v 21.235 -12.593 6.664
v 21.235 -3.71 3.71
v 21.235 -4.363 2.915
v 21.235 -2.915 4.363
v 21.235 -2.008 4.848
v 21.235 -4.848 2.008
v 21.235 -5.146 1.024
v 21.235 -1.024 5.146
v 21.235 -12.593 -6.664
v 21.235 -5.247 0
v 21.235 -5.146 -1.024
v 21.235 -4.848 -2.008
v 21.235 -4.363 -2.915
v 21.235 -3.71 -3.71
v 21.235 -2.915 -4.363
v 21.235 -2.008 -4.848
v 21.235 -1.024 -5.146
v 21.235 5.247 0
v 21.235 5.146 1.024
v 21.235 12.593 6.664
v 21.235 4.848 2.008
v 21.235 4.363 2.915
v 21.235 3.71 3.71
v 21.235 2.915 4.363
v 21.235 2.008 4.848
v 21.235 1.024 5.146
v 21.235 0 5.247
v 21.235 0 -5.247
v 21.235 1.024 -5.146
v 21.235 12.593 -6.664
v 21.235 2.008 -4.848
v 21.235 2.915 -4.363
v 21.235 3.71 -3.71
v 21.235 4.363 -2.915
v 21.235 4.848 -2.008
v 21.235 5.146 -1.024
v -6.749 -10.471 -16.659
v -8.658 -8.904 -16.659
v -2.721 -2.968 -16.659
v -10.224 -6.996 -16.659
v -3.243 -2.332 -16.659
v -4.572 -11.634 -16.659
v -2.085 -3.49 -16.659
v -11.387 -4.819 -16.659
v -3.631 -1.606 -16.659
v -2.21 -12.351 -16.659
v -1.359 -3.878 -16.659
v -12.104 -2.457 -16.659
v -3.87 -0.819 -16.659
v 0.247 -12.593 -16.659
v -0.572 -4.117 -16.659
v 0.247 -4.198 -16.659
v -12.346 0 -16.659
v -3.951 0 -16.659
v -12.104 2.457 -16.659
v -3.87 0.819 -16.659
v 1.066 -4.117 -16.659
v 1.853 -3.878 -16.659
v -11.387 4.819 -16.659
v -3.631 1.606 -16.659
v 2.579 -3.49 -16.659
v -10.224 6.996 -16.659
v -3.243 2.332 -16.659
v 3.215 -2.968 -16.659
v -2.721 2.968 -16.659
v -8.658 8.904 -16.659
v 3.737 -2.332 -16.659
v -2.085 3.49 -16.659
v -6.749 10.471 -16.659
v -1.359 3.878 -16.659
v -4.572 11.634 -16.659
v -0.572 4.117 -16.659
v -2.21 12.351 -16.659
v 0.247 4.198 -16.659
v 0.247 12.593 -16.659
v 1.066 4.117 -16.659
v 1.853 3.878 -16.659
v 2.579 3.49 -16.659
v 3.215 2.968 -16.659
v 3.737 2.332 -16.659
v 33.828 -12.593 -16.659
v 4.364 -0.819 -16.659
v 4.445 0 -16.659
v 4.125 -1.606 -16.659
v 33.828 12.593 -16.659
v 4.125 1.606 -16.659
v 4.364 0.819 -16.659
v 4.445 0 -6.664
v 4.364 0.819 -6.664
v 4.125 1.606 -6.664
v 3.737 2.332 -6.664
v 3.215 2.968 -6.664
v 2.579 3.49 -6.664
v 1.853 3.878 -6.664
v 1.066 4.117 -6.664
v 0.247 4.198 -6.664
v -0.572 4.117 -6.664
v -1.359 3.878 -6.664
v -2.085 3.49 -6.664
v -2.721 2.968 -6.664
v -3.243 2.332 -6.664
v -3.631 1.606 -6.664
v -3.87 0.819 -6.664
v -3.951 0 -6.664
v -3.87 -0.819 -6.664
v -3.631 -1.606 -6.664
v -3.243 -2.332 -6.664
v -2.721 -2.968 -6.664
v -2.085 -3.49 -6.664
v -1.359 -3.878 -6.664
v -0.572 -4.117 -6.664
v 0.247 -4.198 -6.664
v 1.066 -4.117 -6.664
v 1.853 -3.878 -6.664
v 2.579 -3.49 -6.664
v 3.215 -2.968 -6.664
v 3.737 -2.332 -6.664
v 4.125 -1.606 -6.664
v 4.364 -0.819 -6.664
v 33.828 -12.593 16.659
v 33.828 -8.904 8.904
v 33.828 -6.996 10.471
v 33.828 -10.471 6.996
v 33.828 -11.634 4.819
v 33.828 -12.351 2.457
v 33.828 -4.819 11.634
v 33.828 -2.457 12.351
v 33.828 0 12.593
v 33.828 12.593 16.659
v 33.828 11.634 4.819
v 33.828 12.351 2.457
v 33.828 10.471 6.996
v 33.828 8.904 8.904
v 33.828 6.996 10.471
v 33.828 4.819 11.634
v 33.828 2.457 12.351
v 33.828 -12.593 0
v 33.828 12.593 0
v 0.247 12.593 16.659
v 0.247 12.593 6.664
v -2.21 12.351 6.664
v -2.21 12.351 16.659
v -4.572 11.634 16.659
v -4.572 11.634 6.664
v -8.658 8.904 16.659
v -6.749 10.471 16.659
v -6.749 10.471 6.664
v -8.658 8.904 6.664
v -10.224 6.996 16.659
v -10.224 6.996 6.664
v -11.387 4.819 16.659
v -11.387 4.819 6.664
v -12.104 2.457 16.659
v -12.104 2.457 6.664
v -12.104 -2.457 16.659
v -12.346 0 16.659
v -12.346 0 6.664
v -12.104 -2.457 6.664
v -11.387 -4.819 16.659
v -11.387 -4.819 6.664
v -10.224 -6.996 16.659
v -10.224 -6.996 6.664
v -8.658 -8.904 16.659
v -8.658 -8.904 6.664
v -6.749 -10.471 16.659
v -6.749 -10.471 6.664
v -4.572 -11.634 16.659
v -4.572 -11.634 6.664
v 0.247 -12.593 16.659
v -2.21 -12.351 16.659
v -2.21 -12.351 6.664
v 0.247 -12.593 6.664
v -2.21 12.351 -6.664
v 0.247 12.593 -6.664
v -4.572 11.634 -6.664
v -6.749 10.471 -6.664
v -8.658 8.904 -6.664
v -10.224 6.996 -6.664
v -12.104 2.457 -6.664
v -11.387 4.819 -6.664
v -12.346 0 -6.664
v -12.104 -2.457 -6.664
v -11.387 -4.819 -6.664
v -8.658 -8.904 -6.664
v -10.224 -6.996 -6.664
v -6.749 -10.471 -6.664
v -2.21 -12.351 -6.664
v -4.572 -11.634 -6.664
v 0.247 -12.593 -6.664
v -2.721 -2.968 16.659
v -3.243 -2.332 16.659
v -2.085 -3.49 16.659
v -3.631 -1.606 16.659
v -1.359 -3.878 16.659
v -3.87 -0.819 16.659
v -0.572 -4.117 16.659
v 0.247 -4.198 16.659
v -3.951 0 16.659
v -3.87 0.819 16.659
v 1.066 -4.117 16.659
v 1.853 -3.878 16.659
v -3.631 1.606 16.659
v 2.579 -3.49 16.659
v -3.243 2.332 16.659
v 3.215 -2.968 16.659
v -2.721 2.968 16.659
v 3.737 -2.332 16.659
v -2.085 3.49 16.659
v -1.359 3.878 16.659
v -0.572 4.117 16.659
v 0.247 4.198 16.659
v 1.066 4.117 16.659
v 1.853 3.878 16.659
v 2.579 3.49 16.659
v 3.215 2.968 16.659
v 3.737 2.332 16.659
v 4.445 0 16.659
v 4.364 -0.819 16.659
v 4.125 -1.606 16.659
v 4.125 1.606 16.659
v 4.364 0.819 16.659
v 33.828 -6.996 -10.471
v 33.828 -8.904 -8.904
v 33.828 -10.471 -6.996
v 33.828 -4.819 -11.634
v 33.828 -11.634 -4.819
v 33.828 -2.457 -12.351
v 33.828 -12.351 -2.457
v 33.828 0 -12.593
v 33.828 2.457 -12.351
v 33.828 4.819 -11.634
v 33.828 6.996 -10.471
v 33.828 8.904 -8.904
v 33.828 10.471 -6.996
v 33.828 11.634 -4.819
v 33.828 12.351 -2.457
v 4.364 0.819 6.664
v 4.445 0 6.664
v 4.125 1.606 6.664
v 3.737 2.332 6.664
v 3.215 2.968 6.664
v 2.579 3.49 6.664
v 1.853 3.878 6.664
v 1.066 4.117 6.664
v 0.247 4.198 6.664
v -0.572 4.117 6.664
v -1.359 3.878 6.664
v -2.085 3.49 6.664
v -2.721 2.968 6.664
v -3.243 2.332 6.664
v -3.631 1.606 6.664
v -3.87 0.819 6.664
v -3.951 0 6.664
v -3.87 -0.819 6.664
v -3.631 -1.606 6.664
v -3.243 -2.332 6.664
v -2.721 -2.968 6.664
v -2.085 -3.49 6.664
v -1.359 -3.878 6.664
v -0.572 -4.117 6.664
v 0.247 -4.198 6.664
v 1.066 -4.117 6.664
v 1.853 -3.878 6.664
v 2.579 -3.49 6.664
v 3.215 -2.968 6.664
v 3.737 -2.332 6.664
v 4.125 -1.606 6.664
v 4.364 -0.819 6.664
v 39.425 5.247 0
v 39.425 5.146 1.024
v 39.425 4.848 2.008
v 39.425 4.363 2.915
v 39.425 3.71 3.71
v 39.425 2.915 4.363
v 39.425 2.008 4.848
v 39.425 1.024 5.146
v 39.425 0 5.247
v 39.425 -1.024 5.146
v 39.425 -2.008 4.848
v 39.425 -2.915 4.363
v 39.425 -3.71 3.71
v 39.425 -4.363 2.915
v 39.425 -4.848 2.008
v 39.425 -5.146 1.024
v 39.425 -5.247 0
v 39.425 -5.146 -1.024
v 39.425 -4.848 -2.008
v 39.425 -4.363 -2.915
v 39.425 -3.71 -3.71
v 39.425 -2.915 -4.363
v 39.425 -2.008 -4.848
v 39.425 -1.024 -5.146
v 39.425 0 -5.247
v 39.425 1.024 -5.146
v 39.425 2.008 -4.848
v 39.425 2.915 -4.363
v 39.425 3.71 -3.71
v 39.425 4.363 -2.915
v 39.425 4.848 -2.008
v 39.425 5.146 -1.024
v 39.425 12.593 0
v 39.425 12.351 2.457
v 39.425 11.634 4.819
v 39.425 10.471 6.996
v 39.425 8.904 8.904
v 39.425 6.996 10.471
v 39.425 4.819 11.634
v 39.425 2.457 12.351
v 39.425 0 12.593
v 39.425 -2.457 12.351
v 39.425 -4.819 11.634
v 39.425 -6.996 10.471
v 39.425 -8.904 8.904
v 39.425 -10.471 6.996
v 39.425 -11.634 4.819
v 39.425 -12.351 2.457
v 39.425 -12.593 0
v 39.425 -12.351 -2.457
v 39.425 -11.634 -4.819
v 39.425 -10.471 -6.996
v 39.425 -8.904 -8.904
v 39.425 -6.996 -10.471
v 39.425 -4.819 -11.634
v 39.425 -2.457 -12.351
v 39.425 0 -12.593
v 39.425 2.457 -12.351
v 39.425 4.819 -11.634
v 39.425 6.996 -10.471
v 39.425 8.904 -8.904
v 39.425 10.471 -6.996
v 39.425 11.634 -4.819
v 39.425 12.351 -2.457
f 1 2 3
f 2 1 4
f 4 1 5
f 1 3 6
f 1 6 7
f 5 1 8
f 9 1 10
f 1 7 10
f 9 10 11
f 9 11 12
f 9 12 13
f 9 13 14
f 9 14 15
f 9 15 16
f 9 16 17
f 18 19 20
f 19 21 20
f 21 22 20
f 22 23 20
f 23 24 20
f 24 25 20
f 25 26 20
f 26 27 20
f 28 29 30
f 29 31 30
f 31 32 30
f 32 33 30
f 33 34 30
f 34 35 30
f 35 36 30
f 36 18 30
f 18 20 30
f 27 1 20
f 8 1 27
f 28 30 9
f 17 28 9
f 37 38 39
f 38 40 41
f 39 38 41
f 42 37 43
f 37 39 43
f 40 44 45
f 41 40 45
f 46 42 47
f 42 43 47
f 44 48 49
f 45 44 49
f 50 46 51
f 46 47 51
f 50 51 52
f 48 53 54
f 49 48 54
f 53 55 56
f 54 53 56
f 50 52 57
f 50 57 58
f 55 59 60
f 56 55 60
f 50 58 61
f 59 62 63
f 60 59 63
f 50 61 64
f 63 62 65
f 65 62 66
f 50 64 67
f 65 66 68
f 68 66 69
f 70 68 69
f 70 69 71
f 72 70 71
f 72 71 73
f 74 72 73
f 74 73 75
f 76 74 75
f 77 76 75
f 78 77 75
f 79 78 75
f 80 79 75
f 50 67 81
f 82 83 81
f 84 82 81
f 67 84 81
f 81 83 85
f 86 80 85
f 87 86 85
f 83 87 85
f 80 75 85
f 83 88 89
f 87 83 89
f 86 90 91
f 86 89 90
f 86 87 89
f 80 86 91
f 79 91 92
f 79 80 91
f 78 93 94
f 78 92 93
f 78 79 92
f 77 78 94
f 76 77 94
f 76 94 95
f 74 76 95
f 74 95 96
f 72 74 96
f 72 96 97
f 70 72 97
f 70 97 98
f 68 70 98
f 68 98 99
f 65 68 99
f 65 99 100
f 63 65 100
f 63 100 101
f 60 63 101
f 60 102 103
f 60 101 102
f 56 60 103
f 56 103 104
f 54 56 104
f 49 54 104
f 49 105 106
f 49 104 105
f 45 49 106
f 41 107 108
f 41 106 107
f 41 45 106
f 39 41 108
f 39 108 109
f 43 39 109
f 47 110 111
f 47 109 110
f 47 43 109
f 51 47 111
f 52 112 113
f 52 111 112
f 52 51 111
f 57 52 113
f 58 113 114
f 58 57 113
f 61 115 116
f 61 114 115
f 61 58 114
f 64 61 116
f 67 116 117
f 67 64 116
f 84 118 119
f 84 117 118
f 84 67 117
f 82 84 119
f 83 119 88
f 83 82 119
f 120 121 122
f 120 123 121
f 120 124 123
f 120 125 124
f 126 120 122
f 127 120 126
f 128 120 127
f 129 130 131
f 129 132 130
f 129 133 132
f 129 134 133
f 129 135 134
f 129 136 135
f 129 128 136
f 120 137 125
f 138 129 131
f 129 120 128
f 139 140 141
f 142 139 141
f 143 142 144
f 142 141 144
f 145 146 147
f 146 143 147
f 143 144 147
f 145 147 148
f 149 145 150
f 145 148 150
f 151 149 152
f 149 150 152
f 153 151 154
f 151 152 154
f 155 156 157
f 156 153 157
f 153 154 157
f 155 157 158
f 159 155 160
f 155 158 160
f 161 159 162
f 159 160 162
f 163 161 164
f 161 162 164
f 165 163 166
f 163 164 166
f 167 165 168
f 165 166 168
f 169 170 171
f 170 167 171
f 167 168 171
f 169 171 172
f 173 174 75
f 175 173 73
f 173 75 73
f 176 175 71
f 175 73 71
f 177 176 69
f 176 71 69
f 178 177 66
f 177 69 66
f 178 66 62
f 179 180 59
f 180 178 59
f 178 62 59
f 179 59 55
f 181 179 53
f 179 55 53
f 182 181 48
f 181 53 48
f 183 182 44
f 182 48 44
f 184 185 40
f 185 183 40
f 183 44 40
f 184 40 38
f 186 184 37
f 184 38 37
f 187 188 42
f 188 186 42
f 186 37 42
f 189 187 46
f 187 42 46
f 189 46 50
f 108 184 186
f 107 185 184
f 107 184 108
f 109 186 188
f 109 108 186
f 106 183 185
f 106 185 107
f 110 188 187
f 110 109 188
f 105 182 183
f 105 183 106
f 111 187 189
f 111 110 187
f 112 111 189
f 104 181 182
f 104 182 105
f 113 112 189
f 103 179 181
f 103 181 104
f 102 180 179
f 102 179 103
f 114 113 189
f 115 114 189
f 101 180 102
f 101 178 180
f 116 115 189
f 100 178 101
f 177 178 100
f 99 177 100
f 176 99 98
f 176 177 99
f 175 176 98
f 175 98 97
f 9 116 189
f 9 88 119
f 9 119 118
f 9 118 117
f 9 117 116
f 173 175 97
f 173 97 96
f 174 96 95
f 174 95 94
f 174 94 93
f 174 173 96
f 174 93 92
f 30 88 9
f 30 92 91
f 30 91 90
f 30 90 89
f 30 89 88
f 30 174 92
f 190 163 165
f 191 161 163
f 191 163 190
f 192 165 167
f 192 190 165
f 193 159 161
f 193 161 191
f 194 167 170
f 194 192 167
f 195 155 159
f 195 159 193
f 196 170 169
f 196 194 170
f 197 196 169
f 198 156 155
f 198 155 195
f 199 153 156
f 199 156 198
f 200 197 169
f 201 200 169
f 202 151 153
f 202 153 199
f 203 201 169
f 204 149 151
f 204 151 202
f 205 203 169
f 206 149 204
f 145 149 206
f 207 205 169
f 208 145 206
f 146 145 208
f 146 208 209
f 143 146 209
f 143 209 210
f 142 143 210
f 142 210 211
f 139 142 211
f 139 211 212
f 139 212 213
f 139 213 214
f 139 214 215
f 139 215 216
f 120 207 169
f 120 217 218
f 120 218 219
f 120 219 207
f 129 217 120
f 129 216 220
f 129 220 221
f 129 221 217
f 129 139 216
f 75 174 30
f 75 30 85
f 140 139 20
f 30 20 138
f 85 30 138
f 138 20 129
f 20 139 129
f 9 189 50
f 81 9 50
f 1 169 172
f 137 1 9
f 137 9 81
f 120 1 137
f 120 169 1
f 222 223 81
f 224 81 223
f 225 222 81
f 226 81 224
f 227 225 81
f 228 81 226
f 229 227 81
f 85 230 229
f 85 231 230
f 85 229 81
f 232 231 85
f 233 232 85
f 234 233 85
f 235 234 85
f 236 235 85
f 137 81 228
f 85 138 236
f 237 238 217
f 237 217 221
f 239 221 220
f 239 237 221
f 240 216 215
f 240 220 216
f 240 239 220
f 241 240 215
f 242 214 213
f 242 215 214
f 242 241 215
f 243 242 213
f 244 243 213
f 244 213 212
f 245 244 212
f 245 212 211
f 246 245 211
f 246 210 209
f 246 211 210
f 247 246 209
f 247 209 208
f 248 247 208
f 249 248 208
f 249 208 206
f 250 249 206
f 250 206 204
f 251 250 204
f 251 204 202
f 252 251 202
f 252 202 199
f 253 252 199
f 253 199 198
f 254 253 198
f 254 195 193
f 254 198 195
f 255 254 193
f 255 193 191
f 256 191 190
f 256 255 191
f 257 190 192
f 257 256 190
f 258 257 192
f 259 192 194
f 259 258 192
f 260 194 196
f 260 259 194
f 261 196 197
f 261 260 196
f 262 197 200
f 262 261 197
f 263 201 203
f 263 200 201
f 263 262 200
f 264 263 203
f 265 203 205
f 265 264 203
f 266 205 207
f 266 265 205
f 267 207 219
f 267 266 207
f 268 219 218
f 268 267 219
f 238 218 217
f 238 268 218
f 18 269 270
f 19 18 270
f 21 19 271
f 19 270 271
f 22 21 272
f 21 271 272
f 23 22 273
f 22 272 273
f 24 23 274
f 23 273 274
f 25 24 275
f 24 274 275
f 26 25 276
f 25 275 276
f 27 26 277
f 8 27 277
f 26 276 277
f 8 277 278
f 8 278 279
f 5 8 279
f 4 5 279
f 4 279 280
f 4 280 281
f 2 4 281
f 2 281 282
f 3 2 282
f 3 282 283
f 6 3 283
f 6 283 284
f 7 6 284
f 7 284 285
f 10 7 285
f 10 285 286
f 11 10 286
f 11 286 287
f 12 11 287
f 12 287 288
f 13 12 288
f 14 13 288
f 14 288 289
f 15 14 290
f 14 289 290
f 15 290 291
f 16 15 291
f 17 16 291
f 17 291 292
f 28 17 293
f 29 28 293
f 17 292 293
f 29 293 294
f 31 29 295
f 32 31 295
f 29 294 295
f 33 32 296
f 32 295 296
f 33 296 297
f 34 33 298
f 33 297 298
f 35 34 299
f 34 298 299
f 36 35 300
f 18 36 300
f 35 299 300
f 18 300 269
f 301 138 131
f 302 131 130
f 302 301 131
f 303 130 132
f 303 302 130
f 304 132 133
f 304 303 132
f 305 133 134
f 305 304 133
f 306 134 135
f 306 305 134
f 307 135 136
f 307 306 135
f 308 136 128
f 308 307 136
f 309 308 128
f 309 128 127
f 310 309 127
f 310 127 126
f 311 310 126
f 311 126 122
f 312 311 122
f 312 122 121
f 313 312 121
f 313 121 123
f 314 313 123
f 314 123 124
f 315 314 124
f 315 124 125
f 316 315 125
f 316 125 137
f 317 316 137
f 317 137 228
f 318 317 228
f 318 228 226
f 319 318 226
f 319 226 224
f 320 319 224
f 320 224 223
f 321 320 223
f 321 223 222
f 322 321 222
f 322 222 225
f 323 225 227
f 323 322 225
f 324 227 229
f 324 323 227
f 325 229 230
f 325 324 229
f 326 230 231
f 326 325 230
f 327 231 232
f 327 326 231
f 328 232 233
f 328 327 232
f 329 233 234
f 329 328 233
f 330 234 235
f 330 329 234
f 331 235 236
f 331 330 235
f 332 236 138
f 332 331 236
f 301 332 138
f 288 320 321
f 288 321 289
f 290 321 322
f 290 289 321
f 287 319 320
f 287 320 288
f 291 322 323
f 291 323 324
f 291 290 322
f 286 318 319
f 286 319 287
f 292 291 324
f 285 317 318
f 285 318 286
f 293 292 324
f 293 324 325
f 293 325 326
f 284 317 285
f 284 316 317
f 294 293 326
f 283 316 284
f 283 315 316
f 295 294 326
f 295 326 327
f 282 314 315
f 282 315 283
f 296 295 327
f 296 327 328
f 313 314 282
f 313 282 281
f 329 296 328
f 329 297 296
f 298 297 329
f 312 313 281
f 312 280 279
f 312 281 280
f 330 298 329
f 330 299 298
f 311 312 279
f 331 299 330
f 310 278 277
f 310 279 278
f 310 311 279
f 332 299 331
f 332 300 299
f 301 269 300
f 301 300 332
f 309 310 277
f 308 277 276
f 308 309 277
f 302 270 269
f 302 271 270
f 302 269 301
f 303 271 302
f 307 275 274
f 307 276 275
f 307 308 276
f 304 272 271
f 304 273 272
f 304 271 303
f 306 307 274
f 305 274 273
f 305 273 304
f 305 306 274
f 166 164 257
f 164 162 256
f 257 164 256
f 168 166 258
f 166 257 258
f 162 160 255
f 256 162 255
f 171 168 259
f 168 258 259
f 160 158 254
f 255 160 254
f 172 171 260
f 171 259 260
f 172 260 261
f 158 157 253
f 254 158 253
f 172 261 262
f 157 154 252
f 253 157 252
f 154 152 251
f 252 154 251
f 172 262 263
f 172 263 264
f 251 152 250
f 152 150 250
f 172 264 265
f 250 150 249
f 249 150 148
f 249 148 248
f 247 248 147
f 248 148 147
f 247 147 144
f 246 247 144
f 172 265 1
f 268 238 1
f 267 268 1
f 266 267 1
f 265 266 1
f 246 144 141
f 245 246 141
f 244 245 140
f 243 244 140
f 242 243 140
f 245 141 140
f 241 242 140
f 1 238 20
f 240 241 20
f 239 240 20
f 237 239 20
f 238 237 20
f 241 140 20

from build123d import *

# Parameters (mm, degrees)
SKETCH1_W               = 132
SKETCH1_H               = 72
BOSS_EXTRUDE1_DEPTH     = 47.625
CUT_EXTRUDE1_DEPTH      = 122.344808294
CUT_EXTRUDE1_DEPTH_BACK = 122.344808294
SKETCH3_W               = 96
SKETCH3_H               = 38.1
CUT_EXTRUDE2_DEPTH      = 85.25
SKETCH4_R               = 15
CUT_EXTRUDE3_DEPTH      = 85.25
BOSS_EXTRUDE2_START     = 16
SKETCH5_R               = 36
SKETCH5_R_2             = 15
BOSS_EXTRUDE2_DEPTH     = 16
CUT_EXTRUDE4_DEPTH      = 131.738527221
CUT_EXTRUDE4_DEPTH_BACK = 131.738527221
SKETCH6_R               = 12
SCALE1_SCALE            = 0.53
SCALE2_SCALE            = 0.66


with BuildPart() as part:
    # Sketch1 → Boss-Extrude1 (new, symmetric)
    with BuildSketch(Plane.XY):
        Rectangle(SKETCH1_W, SKETCH1_H)
    extrude(amount=BOSS_EXTRUDE1_DEPTH, both=True)

    # Sketch2 → Cut-Extrude1 (cut, two sides: drawn at the far end of the back side and taken through both)
    with BuildSketch(Plane.XY.offset(47.625).offset(-CUT_EXTRUDE1_DEPTH_BACK)):
        with BuildLine():
            Line((220.000003209, 36), (-30, 36))
            ThreePointArc((-30, 36), (-66, 1.003e-06), (-30.000002006, -36))
            Line((-30.000002006, -36), (220.000001203, -36.000013927))
            Line((220.000001203, -36.000013927), (-280.000005214, -36))
            Line((-280.000005214, -36), (-280.000003209, 36.000013927))
            Line((-280.000003209, 36.000013927), (220.000003209, 36))
        make_face()
    extrude(amount=CUT_EXTRUDE1_DEPTH + CUT_EXTRUDE1_DEPTH_BACK, mode=Mode.SUBTRACT)

    # Sketch3 → Cut-Extrude2 (cut)
    with BuildSketch(Plane(origin=(0, 36, 0), x_dir=(1, 0, 0), z_dir=(0, 1, 0))):
        with Locations((-18, 0)):
            Rectangle(SKETCH3_W, SKETCH3_H)
    extrude(amount=-CUT_EXTRUDE2_DEPTH, mode=Mode.SUBTRACT)

    # Sketch4 → Cut-Extrude3 (cut)
    with BuildSketch(Plane(origin=(66, 0, 0), x_dir=(0, 0, -1), z_dir=(1, 0, 0))):
        with Locations(Location((0, 0, 0), (0, 0, 90))):
            Circle(SKETCH4_R)
    extrude(amount=-CUT_EXTRUDE3_DEPTH, mode=Mode.SUBTRACT)

    # Sketch5 → Boss-Extrude2 (add)
    with BuildSketch(Plane(origin=(66, 0, 0), x_dir=(0, 0, -1), z_dir=(1, 0, 0)).offset(BOSS_EXTRUDE2_START)):
        with Locations(Location((0, 0, 0), (0, 0, 90))):
            Circle(SKETCH5_R)
        with Locations(Location((0, 0, 0), (0, 0, 90))):
            Circle(SKETCH5_R_2, mode=Mode.SUBTRACT)
    extrude(amount=-BOSS_EXTRUDE2_DEPTH)

    # Sketch6 → Cut-Extrude4 (cut, two sides: drawn at the far end of the back side and taken through both)
    with BuildSketch(Plane.XY.offset(47.625).offset(-CUT_EXTRUDE4_DEPTH_BACK)):
        with Locations((-30, 0)):
            Circle(SKETCH6_R)
    extrude(amount=CUT_EXTRUDE4_DEPTH + CUT_EXTRUDE4_DEPTH_BACK, mode=Mode.SUBTRACT)


with BuildPart() as part_1:
    # Scale1: scaled about (16.519385086, 0, 0)
    add(part.part.scale(SCALE1_SCALE).moved(Location((7.76411099, 0, 0))))


with BuildPart() as part_2:
    # Scale2: scaled about (16.519385086, 0, 0)
    add(part_1.part.scale(SCALE2_SCALE).moved(Location((5.616590929, 0, 0))))


solid = part_2.part
